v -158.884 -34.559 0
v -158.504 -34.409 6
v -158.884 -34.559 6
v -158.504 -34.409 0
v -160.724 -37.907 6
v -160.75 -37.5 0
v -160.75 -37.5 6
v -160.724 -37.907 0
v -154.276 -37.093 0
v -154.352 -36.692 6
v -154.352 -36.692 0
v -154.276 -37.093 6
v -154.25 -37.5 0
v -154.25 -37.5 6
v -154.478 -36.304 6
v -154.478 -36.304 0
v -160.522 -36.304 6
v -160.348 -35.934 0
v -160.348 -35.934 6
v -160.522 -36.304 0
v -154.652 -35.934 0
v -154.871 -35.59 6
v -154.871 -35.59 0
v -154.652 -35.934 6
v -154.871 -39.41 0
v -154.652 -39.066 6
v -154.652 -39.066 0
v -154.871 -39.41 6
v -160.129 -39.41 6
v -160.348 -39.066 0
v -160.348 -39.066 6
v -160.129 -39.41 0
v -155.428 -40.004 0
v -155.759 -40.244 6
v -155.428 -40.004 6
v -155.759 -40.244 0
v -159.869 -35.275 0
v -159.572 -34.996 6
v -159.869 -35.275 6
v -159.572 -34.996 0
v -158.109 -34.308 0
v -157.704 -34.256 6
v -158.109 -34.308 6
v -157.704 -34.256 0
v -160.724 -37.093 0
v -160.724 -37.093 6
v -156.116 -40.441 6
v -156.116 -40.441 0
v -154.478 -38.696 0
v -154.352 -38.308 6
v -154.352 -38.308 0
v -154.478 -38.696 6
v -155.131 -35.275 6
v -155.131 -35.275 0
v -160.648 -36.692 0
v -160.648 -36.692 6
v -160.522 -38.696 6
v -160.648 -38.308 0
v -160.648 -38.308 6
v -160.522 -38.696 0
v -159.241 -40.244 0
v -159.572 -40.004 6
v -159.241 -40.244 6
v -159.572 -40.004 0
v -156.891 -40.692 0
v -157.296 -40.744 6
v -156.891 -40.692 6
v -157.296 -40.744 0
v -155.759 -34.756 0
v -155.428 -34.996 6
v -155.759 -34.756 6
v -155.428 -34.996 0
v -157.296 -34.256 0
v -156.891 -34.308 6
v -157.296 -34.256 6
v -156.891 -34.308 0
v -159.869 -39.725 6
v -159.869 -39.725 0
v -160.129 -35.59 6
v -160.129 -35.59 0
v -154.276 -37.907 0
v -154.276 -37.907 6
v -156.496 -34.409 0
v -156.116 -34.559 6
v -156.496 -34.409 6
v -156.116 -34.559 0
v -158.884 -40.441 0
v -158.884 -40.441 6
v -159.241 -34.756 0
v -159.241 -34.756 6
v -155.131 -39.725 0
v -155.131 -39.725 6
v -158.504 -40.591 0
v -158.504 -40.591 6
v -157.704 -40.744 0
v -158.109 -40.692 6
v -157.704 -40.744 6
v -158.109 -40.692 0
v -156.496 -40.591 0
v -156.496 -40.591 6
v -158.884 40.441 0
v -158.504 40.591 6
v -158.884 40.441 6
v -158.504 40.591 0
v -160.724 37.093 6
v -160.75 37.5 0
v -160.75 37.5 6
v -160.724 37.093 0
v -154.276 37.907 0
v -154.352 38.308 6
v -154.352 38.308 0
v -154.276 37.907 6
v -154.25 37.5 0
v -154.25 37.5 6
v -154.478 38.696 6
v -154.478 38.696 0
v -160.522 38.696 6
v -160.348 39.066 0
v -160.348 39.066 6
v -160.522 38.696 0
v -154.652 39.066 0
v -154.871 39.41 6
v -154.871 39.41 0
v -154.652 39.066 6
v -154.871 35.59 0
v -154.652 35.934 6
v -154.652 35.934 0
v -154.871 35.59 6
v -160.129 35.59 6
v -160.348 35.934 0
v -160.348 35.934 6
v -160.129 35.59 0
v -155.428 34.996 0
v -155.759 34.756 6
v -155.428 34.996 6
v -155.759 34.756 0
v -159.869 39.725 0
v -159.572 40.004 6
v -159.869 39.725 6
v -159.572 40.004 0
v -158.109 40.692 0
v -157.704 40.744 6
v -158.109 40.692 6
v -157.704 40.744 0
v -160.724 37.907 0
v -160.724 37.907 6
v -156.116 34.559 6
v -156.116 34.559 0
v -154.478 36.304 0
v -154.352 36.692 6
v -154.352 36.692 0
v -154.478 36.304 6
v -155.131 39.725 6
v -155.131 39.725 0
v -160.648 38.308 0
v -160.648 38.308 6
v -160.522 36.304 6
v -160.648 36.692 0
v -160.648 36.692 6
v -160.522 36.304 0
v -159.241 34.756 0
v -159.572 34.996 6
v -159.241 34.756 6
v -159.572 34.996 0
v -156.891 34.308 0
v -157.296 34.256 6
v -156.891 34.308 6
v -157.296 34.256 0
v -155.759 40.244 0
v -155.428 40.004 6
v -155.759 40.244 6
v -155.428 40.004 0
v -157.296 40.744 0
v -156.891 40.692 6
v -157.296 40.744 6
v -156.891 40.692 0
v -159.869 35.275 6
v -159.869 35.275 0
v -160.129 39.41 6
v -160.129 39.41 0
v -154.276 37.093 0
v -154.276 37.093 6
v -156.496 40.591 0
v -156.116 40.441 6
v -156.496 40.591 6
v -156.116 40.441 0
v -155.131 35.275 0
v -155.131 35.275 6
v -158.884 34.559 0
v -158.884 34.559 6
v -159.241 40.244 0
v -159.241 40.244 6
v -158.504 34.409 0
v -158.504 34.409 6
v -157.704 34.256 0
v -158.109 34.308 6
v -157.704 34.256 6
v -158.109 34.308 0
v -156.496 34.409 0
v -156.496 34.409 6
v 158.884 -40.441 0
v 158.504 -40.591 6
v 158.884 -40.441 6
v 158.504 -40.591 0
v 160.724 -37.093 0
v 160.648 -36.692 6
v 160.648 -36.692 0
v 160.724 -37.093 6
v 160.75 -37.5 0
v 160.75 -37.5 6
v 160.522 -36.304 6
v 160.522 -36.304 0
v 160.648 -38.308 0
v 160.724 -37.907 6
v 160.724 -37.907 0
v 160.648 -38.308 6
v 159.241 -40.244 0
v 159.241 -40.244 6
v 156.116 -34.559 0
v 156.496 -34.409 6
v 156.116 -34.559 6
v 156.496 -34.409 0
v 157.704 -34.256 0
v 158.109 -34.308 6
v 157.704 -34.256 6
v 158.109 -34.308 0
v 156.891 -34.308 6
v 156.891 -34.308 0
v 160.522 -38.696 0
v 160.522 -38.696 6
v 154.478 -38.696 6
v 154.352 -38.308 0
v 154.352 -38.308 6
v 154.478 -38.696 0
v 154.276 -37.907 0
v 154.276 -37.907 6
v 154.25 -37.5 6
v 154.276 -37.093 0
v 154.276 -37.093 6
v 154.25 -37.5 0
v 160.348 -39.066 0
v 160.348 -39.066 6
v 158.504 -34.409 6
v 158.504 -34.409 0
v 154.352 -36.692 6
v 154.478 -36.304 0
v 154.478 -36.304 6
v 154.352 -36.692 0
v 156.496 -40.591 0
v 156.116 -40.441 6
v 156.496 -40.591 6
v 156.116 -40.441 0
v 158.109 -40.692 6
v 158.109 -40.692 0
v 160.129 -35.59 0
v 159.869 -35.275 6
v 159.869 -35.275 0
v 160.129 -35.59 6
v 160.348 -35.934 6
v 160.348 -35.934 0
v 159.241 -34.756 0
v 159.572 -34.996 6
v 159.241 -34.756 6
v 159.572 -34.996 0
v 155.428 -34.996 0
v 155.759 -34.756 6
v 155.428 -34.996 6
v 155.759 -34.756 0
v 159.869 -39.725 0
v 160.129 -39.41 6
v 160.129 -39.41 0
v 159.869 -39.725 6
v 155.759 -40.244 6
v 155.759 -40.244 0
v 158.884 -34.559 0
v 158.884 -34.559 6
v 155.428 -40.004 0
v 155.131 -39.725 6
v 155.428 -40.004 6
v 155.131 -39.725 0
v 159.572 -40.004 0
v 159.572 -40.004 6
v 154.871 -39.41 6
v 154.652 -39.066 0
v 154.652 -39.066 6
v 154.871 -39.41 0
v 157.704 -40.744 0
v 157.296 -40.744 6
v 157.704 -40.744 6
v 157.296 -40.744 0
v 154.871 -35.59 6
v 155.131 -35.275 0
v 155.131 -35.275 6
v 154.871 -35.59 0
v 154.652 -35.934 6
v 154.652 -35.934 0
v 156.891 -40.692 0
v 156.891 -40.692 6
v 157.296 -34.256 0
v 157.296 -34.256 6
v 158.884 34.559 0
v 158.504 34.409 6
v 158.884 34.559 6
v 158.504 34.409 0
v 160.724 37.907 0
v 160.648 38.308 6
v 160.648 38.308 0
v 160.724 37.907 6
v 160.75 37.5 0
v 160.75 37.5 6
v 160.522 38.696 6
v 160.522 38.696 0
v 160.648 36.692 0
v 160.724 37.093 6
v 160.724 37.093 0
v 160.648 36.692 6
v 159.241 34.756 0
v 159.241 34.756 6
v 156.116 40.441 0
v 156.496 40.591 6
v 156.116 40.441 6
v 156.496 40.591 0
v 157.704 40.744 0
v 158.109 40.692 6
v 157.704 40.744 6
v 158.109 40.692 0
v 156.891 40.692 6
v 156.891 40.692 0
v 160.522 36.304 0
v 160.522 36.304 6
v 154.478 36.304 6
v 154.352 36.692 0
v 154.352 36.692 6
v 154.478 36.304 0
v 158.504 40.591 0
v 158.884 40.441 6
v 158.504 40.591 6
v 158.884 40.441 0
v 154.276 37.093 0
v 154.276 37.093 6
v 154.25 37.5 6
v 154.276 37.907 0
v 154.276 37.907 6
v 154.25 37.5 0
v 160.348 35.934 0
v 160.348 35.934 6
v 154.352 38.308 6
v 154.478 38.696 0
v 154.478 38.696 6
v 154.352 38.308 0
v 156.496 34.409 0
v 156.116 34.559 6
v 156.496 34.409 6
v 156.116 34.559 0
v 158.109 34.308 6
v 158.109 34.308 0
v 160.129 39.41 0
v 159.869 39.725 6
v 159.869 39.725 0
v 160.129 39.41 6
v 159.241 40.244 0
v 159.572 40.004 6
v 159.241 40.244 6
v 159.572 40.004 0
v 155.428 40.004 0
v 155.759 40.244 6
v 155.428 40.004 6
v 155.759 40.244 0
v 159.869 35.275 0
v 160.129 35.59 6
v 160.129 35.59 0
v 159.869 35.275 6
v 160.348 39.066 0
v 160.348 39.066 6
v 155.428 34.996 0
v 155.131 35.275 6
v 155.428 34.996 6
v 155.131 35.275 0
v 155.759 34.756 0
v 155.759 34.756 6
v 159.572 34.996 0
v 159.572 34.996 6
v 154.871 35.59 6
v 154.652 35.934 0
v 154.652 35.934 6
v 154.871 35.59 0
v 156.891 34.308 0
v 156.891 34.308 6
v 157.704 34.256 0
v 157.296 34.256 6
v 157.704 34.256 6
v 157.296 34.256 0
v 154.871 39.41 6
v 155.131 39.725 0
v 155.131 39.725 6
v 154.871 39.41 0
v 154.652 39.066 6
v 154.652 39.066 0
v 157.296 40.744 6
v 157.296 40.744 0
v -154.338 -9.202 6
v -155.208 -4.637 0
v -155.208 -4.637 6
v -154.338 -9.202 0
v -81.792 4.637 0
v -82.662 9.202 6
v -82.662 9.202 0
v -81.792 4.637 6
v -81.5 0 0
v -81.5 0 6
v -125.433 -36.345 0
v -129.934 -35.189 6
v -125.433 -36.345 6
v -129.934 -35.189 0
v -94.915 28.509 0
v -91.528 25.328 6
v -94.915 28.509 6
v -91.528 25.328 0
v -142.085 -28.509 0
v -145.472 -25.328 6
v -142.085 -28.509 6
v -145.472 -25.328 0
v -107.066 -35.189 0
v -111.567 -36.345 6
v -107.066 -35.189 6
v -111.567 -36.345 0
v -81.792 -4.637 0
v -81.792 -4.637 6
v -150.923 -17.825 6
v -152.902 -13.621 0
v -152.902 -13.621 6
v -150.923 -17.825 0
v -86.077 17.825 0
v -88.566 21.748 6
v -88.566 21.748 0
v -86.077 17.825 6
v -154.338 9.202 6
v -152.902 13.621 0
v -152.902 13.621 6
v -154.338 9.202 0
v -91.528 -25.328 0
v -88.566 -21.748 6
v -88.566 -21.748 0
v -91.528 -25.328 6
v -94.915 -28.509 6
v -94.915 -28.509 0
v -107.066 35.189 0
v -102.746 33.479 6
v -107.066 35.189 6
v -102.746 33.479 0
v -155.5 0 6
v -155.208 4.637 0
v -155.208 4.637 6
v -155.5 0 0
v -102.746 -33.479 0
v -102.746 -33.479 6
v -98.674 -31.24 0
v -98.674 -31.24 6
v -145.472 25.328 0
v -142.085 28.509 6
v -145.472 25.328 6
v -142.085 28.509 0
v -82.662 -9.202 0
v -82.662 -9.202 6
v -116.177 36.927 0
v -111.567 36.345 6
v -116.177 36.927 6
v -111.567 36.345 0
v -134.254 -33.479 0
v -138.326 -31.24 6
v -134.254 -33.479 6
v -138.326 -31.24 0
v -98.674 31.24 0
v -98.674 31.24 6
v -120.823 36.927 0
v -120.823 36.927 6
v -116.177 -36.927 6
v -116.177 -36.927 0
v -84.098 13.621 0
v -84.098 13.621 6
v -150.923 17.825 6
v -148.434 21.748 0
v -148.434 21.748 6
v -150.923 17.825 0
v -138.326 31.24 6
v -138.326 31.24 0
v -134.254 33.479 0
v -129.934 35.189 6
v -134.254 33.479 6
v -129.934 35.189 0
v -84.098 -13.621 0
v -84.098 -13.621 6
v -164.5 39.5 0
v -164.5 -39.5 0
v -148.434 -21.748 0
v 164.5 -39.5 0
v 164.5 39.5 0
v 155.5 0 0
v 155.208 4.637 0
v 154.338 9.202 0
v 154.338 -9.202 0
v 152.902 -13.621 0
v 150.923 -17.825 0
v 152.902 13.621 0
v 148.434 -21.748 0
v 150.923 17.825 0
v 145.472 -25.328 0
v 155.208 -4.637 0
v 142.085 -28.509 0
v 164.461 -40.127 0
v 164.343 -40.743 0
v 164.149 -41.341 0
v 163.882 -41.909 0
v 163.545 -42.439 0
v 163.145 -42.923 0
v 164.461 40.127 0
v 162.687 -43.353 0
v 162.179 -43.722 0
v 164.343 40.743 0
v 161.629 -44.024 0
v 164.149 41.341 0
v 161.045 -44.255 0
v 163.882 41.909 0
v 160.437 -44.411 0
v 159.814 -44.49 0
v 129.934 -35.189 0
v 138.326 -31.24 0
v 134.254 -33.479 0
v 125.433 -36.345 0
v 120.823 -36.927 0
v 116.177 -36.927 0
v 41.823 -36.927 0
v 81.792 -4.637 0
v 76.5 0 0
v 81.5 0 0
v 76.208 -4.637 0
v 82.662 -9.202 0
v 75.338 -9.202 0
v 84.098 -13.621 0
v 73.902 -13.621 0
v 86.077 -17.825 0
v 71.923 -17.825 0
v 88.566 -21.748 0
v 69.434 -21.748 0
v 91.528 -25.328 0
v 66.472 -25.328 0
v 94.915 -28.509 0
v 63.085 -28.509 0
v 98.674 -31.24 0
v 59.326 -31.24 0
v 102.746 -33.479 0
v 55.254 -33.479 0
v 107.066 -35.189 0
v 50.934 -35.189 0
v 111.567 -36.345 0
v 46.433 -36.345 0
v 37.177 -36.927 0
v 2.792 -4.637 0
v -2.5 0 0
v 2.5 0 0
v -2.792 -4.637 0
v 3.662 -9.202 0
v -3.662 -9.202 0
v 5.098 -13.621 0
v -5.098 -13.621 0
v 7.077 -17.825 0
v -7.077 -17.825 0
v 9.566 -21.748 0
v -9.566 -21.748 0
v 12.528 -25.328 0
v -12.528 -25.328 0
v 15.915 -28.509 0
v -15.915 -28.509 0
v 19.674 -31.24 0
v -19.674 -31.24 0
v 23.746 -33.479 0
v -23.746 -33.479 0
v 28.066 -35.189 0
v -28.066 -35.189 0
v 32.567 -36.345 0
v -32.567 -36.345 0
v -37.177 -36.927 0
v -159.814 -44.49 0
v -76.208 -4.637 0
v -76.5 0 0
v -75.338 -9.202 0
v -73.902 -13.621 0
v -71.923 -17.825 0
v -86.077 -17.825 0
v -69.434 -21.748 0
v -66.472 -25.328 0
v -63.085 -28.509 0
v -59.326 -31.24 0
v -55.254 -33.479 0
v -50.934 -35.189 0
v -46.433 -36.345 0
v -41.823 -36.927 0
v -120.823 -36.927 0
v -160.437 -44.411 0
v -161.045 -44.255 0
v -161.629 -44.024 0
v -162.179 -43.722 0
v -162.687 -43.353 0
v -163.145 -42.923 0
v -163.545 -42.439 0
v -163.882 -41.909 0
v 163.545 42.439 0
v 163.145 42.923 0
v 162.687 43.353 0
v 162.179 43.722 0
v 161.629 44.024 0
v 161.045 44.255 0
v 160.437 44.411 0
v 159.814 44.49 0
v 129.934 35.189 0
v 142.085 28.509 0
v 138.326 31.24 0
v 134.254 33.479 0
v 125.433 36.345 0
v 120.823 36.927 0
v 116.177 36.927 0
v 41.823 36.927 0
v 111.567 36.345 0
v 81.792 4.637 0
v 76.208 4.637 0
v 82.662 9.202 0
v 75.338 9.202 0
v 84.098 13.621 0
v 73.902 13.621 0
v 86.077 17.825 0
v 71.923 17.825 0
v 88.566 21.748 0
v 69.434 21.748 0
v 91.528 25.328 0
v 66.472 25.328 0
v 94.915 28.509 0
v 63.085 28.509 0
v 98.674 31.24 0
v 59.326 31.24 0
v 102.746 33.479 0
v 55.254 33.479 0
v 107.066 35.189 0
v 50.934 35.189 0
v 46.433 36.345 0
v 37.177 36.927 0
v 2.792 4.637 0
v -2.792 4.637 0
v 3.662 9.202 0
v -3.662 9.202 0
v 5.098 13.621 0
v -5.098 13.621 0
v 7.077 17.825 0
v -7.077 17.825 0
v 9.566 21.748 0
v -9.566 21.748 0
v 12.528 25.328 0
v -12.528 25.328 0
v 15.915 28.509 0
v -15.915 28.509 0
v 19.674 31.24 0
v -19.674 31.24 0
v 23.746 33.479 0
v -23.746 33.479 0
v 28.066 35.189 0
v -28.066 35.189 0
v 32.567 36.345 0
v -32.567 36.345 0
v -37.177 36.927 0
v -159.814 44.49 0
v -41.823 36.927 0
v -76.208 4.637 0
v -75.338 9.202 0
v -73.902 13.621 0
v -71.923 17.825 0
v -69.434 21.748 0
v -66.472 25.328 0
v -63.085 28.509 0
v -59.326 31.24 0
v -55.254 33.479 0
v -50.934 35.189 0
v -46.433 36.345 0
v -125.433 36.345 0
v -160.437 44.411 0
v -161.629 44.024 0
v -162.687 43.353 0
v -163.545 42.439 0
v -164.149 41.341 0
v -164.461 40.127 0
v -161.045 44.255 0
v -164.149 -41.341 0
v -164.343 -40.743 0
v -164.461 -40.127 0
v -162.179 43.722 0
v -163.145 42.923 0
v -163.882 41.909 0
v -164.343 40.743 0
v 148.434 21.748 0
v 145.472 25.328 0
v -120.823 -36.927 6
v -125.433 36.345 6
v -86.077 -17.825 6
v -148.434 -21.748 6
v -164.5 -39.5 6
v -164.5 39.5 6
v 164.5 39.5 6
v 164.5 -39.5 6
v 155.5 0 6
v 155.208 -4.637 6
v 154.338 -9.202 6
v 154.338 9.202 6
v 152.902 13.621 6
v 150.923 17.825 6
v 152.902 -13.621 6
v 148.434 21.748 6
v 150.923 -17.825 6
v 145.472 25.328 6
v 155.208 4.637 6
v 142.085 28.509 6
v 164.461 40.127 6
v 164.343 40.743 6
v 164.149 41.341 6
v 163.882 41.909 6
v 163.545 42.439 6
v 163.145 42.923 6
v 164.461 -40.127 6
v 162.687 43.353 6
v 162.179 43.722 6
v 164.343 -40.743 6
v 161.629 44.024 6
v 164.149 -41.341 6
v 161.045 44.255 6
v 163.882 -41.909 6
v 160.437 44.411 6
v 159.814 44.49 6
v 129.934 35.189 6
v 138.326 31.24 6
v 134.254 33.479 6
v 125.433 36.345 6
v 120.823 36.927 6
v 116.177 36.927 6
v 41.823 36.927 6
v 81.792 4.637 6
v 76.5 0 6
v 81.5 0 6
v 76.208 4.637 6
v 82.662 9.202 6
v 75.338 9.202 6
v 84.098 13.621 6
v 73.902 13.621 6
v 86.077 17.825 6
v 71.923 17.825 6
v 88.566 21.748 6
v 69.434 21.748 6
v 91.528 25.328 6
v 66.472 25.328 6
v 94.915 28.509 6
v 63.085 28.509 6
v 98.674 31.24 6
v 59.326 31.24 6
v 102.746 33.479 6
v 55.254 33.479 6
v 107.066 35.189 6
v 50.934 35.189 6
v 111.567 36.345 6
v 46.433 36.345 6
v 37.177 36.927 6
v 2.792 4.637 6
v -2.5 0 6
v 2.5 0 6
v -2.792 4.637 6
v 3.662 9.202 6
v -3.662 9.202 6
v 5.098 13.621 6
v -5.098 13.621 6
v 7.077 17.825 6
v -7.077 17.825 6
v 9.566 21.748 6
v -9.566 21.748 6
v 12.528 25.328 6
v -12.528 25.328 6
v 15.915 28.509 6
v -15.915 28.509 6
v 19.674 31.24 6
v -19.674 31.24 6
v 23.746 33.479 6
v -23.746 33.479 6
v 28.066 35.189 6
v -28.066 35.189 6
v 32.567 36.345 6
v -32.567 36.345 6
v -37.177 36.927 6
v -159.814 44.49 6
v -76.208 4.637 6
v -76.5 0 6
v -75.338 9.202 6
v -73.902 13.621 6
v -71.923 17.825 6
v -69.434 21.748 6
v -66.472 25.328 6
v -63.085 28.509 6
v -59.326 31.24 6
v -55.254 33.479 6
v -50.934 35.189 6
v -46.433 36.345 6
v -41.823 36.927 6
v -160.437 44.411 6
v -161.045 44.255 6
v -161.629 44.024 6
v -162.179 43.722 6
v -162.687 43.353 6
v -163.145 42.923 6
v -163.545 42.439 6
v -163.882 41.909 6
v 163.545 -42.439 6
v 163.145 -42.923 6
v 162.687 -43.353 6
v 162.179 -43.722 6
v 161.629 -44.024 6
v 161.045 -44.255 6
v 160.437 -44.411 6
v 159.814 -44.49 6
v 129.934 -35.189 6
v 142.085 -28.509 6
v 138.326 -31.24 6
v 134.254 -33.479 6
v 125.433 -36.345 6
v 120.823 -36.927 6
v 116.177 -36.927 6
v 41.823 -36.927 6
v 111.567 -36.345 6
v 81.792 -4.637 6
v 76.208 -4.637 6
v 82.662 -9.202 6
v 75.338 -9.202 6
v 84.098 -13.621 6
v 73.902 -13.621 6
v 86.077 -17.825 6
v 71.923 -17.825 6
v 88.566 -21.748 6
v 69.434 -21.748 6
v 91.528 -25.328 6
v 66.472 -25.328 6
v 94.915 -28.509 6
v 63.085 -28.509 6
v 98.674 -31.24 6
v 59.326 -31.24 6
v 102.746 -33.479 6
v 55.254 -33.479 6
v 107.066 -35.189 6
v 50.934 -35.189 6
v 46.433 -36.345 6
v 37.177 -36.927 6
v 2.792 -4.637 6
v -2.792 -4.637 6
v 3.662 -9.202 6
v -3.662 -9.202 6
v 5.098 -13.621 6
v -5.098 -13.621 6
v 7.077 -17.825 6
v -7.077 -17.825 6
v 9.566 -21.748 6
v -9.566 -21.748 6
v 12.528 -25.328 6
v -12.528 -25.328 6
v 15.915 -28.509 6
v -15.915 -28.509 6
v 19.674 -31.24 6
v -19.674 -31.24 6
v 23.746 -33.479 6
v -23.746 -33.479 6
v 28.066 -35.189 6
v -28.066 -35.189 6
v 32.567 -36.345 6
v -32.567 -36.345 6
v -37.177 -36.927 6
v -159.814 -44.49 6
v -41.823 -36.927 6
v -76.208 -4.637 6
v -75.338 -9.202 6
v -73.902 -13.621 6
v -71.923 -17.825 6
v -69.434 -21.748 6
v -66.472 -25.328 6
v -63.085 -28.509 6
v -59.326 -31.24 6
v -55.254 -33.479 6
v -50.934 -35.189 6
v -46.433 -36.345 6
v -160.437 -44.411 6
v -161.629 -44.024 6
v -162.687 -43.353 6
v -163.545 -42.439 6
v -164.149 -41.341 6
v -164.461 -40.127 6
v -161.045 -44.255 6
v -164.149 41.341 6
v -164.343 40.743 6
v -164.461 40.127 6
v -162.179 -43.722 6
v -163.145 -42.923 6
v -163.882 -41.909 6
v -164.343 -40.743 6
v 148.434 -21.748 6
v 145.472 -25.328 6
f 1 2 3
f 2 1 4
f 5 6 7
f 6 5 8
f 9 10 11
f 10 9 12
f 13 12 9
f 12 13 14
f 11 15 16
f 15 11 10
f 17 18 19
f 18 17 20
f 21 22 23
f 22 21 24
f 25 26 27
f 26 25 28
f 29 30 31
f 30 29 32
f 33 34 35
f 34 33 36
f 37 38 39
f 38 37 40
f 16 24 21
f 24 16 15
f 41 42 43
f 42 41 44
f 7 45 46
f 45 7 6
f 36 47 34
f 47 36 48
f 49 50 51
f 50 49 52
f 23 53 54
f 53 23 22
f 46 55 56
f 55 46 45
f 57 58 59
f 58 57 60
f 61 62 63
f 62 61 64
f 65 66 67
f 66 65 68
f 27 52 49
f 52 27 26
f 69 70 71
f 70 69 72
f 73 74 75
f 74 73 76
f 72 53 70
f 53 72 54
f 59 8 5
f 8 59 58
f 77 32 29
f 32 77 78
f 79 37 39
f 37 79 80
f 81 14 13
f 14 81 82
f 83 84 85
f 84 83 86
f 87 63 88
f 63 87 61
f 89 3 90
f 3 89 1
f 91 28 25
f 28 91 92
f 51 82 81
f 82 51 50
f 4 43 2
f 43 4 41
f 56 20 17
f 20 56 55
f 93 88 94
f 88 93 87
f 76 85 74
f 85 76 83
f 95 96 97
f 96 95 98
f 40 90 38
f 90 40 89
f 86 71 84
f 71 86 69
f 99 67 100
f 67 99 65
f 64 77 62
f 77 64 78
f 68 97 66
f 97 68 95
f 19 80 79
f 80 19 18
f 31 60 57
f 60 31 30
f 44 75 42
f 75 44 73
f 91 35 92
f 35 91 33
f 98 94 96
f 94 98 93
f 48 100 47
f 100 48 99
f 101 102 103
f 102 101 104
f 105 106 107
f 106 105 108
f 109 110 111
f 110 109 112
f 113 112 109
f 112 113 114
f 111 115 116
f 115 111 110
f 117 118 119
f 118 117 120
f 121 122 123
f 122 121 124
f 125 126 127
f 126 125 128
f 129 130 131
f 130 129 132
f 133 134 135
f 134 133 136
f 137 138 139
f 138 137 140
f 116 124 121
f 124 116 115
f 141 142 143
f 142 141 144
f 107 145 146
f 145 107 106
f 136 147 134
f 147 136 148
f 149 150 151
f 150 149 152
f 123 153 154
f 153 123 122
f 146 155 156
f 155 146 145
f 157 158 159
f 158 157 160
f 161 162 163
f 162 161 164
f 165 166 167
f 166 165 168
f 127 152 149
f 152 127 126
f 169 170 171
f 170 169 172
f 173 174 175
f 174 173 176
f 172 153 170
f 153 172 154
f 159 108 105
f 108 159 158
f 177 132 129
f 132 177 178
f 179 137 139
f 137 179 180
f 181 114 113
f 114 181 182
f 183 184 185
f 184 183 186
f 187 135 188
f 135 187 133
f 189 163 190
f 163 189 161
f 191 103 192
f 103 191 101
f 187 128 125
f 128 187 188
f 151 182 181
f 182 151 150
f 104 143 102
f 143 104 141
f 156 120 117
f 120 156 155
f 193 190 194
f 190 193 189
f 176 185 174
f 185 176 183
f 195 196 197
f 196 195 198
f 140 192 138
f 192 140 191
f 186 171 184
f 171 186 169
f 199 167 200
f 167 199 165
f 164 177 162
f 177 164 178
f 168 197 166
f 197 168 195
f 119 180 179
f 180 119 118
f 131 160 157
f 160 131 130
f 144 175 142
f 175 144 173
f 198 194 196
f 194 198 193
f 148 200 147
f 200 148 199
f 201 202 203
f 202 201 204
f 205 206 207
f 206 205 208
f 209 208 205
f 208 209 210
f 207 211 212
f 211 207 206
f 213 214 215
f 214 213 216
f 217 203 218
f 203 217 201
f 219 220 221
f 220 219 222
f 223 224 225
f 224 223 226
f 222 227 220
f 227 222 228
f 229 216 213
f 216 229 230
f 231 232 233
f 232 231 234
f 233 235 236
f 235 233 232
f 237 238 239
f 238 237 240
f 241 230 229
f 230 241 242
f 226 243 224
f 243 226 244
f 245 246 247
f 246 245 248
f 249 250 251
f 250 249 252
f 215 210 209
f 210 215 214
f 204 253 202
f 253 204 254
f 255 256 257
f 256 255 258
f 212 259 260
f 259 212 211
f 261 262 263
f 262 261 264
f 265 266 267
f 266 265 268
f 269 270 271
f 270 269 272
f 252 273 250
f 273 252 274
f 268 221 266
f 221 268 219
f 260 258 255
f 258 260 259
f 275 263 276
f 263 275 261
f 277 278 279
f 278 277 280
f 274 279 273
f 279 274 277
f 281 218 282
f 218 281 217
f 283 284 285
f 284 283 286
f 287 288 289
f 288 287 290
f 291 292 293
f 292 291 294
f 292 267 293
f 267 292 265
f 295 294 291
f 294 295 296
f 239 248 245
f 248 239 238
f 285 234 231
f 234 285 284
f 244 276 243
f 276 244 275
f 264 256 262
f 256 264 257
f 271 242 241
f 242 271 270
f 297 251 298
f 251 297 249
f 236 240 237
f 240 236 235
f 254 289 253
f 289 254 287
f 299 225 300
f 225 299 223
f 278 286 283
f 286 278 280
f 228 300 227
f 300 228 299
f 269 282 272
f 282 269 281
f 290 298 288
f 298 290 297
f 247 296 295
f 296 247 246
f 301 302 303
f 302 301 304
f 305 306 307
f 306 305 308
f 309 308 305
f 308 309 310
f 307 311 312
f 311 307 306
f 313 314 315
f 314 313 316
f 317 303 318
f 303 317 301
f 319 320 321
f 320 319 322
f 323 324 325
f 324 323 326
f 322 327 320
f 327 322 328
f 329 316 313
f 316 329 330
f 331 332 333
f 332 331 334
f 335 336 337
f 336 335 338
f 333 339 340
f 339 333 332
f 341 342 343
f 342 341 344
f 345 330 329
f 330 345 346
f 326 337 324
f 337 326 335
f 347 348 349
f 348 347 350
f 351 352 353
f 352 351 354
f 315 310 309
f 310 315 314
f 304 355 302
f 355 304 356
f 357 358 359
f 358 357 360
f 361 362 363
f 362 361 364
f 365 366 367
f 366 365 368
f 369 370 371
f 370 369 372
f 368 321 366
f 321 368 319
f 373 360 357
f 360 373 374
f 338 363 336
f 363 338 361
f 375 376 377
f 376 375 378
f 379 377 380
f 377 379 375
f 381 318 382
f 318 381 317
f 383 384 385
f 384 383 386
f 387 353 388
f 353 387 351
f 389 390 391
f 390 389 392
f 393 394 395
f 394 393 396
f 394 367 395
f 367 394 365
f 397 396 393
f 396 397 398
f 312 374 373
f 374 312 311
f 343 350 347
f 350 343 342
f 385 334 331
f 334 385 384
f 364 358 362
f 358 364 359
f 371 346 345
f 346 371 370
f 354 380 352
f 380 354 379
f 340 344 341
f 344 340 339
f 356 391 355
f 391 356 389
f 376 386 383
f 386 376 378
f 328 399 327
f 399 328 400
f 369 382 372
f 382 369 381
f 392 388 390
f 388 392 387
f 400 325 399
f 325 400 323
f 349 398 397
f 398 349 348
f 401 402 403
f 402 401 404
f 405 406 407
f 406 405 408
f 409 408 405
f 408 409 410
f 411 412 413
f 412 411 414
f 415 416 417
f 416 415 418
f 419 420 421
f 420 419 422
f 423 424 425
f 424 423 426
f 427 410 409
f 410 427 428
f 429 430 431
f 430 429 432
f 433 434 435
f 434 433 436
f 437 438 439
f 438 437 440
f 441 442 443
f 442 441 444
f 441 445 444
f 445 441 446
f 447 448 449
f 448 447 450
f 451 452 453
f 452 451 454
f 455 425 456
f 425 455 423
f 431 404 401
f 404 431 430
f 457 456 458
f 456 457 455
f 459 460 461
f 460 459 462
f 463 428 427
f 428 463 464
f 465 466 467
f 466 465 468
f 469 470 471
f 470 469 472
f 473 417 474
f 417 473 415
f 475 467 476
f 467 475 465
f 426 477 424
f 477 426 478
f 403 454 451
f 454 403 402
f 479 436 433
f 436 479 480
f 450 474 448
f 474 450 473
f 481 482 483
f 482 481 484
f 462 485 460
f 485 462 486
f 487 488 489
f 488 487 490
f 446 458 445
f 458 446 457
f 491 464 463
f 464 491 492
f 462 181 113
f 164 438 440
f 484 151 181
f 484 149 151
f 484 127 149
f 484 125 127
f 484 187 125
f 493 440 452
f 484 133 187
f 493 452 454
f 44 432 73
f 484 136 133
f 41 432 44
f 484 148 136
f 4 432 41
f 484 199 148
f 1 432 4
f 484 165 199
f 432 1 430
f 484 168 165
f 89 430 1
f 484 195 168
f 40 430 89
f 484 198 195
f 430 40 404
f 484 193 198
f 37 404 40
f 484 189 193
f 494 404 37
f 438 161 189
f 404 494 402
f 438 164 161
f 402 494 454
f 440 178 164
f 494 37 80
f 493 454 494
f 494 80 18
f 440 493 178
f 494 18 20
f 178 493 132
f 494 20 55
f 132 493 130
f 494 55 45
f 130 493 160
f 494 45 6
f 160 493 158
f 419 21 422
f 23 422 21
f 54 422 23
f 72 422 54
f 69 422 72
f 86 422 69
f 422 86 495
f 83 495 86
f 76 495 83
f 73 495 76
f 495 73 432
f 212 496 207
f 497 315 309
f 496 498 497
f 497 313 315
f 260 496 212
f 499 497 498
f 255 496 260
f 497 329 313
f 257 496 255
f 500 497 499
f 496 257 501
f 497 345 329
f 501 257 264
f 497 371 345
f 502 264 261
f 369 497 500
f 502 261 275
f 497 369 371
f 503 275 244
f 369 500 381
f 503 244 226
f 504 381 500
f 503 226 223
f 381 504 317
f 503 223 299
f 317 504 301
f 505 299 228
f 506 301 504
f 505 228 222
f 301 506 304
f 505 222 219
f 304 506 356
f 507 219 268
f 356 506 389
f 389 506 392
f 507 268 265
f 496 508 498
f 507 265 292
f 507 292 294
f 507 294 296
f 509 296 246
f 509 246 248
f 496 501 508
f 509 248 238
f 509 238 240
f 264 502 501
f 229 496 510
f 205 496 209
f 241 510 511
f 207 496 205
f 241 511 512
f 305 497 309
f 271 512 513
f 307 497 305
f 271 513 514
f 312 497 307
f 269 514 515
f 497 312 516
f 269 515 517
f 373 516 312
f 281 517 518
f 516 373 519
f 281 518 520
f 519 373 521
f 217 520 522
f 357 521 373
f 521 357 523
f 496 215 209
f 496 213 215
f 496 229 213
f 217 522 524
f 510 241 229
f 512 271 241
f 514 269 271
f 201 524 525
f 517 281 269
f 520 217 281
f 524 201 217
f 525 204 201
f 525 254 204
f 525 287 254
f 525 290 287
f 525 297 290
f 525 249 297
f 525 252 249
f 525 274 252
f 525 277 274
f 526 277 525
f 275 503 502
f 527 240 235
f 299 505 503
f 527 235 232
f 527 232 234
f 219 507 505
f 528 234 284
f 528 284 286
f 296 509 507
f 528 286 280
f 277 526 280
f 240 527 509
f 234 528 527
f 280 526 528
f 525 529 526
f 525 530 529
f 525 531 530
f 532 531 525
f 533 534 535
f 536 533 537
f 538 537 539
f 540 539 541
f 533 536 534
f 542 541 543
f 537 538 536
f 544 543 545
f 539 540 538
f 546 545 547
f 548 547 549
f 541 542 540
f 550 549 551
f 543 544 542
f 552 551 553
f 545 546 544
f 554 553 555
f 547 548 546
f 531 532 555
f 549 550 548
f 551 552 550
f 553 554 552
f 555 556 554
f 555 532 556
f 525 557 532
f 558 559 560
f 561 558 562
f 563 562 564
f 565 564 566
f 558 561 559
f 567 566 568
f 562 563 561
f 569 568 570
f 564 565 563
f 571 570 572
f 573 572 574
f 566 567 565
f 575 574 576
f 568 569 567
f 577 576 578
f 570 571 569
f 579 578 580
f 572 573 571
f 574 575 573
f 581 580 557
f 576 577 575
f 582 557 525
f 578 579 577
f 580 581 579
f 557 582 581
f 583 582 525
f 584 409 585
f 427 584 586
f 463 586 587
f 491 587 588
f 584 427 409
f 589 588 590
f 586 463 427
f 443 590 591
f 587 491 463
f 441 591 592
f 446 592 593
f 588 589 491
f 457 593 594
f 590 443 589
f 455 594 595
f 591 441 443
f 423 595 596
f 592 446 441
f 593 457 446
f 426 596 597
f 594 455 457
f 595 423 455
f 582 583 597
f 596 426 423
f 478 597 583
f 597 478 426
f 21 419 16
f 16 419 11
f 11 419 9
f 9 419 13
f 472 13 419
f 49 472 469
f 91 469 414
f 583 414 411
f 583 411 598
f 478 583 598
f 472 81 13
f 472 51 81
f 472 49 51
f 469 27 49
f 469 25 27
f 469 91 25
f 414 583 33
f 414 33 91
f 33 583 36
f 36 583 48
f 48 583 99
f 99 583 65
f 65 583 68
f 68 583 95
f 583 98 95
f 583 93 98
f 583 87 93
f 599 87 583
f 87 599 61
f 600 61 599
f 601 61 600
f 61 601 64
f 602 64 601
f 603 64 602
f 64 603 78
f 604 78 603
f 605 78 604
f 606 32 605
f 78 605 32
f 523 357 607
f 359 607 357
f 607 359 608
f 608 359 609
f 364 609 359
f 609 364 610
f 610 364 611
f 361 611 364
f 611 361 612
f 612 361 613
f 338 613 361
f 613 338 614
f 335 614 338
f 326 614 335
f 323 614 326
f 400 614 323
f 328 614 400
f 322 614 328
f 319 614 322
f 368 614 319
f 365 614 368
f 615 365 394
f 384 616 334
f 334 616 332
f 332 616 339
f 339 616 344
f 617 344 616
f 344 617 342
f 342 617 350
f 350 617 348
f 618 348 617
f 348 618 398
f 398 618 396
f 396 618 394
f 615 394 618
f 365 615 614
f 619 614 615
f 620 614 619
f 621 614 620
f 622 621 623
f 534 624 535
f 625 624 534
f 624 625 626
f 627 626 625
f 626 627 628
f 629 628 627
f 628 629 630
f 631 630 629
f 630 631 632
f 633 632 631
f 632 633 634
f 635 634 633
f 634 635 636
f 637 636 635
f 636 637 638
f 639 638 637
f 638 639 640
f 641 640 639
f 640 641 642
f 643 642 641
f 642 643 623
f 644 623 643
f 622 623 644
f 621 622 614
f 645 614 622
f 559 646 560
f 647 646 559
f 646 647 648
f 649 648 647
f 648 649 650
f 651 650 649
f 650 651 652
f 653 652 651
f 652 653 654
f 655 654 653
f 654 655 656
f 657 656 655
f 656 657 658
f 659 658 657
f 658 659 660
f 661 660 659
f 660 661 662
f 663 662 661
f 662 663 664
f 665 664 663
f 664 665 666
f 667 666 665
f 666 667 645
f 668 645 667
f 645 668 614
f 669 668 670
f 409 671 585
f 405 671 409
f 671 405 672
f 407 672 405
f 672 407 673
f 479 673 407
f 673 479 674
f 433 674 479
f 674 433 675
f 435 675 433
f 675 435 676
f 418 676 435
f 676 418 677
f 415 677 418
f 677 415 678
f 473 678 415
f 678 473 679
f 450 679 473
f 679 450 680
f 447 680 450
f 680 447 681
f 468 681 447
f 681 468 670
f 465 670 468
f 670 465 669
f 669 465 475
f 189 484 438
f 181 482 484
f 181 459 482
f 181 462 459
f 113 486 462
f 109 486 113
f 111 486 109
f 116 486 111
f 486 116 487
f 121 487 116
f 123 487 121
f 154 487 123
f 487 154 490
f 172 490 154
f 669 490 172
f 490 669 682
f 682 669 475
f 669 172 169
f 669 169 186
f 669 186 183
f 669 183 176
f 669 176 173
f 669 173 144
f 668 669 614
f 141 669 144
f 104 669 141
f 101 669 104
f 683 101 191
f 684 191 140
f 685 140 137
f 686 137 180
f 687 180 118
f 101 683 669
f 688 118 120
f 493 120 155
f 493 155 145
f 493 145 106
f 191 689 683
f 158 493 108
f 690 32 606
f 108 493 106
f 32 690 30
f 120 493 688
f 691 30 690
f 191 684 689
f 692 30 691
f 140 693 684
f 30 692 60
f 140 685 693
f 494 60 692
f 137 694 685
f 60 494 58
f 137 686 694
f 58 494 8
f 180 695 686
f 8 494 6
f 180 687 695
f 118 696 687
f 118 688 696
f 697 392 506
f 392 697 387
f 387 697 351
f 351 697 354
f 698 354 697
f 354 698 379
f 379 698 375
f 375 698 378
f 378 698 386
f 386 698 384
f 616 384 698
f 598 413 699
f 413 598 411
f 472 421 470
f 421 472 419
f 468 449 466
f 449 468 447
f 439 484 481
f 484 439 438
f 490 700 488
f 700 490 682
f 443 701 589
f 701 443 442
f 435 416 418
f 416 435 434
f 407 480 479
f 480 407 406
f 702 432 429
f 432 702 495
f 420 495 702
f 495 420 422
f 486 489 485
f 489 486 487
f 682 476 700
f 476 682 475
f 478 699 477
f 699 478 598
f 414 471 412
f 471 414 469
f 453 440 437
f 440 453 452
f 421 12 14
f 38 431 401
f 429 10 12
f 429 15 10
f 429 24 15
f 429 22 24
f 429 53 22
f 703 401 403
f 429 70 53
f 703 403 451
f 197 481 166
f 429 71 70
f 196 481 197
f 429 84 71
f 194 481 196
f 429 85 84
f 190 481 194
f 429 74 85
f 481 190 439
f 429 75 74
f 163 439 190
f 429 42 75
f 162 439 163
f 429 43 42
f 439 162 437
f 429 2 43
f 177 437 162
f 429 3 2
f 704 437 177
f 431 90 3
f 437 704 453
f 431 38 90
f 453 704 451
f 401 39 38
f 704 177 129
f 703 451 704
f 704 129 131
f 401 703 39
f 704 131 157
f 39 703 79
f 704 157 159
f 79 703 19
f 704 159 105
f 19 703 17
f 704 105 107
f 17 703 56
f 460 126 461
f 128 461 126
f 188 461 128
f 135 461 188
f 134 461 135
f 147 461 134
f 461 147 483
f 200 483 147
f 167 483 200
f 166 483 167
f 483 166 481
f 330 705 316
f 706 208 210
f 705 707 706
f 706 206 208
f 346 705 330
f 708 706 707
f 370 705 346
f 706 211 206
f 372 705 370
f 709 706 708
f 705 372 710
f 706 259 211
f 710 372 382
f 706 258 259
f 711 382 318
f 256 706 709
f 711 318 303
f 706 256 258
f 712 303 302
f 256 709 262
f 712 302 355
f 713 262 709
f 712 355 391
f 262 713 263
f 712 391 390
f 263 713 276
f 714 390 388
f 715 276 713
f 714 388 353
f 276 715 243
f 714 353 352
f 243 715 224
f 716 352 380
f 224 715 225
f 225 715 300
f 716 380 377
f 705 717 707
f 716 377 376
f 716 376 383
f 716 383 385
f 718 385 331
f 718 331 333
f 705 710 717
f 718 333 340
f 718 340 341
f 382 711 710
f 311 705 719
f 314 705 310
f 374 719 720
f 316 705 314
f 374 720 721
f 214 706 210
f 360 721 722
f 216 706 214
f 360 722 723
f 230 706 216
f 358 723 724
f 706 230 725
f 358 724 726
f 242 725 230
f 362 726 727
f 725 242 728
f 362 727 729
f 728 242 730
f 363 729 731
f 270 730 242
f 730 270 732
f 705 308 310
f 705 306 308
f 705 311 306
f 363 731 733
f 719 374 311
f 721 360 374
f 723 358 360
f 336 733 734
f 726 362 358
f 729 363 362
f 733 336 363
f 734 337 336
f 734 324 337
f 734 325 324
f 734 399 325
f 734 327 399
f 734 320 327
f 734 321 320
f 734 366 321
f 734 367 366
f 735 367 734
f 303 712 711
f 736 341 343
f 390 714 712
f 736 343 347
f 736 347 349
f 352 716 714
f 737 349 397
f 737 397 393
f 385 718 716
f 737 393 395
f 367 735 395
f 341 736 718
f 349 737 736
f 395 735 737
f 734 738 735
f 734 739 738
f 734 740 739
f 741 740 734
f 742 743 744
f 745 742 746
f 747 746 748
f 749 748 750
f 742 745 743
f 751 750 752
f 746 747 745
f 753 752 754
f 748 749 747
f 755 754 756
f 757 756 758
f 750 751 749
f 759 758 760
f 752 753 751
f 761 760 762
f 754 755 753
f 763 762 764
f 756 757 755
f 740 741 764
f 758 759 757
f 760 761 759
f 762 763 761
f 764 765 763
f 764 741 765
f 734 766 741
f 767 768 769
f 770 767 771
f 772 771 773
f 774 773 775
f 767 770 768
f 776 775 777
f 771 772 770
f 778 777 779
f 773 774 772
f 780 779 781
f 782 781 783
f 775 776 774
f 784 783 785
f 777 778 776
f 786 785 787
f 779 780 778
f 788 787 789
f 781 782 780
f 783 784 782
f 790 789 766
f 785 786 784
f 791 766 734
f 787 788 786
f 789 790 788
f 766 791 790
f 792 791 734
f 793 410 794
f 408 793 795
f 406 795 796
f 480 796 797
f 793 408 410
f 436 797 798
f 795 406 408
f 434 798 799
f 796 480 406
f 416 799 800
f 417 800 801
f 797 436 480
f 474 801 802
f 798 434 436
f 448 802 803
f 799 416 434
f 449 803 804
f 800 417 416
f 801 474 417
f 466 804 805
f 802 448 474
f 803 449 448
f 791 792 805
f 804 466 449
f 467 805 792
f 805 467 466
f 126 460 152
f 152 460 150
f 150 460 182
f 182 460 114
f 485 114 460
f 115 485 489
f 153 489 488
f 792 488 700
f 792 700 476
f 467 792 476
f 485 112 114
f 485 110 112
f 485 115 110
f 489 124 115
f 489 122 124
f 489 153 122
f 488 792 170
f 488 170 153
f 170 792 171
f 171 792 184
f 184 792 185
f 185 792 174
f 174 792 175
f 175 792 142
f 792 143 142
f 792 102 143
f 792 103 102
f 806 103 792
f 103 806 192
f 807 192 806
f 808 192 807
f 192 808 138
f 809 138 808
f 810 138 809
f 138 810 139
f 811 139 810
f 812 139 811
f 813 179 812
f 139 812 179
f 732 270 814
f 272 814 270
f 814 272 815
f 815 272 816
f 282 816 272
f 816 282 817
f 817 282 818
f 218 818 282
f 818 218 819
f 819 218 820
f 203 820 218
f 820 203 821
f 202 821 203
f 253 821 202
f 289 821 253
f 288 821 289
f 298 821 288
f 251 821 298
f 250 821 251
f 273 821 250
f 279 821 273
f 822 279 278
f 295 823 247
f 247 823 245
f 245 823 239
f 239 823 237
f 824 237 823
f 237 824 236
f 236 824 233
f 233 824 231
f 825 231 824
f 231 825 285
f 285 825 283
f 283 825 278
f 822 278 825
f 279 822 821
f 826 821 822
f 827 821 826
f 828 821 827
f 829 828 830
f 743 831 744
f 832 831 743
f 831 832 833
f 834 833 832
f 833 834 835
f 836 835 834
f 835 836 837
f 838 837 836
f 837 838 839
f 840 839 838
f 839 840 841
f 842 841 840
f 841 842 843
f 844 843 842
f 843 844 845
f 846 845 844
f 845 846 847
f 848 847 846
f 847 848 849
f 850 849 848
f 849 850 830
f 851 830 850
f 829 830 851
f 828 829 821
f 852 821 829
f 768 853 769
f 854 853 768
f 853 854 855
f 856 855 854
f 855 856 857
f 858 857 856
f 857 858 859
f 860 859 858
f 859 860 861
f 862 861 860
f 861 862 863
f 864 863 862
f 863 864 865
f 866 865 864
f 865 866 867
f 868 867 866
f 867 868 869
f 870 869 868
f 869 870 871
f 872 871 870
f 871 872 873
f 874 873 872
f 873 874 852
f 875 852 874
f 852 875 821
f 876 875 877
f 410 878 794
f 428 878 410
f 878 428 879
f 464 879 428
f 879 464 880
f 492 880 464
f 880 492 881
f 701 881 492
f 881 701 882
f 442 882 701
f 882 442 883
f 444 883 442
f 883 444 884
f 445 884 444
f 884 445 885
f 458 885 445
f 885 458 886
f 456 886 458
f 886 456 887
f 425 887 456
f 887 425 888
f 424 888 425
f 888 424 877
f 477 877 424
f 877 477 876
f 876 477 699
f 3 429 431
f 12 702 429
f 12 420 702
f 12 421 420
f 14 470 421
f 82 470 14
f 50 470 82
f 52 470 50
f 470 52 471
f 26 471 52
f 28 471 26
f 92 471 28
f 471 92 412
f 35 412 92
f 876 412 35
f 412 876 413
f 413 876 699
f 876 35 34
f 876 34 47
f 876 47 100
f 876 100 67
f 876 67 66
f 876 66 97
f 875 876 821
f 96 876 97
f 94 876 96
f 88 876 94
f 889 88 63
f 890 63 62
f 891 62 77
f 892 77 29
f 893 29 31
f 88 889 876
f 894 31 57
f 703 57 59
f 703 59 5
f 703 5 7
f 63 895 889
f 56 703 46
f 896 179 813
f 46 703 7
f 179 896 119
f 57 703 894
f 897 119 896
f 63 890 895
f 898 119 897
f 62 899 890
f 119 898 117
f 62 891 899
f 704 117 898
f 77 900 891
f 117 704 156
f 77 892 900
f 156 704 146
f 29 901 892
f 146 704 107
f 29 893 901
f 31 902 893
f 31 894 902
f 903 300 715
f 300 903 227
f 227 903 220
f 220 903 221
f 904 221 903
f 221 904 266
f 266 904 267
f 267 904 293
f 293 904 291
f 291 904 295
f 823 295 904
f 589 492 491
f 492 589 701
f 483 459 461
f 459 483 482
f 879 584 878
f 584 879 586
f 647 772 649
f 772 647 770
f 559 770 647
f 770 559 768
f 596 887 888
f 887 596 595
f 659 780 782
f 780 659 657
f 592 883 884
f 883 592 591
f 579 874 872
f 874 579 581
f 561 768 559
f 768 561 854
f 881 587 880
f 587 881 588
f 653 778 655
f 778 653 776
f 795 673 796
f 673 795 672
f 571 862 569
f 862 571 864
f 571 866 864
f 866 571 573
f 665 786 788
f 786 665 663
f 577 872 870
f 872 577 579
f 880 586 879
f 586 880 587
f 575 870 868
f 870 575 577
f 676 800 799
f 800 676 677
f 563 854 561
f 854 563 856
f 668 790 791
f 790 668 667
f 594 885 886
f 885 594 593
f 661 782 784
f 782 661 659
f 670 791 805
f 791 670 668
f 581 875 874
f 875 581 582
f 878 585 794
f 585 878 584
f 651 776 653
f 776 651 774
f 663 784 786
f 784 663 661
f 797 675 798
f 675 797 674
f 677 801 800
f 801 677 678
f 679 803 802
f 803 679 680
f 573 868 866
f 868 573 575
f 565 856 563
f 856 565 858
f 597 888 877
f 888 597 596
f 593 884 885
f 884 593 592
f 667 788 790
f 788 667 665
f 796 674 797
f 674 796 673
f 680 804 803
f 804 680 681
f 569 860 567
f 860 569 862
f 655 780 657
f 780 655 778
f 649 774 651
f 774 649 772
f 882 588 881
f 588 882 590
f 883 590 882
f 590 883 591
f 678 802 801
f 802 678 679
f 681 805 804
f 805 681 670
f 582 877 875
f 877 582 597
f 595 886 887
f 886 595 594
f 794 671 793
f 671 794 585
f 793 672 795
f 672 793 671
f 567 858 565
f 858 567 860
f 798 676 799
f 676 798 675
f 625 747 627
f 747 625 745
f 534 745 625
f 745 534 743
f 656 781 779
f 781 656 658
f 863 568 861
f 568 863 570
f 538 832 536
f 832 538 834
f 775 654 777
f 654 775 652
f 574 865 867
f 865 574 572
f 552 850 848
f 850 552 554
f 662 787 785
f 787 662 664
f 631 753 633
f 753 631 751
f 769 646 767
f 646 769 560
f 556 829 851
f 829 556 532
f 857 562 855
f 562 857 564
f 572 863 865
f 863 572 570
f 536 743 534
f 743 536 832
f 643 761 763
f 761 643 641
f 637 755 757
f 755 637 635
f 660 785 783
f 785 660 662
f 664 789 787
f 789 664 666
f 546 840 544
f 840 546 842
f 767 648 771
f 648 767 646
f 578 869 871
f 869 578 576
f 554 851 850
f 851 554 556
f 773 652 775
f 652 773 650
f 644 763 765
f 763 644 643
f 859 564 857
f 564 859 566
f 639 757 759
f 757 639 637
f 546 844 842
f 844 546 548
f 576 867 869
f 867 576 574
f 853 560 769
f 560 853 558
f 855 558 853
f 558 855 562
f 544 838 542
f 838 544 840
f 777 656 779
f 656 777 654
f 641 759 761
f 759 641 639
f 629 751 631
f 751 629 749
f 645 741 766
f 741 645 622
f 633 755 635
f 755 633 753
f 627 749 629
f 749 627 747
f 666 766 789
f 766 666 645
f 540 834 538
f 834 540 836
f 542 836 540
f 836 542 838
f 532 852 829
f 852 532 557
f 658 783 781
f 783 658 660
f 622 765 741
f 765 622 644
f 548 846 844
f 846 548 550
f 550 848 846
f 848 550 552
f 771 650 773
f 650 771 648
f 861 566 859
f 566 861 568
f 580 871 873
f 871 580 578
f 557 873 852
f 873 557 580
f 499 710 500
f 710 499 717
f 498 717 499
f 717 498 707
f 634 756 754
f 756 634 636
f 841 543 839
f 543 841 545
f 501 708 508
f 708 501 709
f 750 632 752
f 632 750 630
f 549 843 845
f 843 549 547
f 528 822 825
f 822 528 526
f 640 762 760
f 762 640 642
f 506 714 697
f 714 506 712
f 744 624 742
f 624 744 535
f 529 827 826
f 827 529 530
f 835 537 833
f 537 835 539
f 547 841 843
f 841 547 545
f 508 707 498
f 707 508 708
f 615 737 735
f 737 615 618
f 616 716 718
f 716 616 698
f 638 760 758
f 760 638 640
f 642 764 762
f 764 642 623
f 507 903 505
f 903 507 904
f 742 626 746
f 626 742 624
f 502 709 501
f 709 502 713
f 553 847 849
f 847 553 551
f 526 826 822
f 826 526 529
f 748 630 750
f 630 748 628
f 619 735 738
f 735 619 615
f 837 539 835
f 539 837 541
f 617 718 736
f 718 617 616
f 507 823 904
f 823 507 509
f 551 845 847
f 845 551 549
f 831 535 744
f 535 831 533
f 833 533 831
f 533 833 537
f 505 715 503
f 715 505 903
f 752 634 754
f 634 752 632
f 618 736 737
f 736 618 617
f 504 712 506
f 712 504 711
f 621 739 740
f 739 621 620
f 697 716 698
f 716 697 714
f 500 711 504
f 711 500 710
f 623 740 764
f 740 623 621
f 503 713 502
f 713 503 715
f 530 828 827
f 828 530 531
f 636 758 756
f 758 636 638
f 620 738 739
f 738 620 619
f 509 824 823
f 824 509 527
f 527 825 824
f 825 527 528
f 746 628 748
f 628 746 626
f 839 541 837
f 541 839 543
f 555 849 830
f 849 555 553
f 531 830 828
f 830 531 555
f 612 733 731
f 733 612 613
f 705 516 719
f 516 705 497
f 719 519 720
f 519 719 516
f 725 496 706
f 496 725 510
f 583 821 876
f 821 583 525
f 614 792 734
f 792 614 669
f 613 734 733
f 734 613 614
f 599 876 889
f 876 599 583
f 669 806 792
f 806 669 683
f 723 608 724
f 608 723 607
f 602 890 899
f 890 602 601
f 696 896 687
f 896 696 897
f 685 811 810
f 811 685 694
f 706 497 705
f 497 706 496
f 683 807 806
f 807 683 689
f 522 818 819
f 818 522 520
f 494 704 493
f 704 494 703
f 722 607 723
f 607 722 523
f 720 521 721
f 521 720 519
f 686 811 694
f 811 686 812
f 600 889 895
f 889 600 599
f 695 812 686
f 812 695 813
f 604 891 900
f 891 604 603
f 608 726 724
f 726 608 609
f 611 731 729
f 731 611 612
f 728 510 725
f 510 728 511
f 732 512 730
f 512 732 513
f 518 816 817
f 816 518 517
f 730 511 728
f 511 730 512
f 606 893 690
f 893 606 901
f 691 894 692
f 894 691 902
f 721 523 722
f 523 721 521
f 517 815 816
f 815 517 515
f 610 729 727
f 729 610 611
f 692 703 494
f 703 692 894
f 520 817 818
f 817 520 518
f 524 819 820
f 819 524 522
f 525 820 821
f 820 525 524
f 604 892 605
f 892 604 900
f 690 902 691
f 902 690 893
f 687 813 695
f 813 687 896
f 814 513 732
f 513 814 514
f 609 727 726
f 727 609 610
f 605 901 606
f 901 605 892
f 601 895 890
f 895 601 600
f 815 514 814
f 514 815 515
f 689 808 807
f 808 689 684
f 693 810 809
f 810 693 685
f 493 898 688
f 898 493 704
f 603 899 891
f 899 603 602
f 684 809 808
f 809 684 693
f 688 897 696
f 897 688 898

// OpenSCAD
$fn = 50;


difference() {
	union() {
		hull() {
			translate(v = [-159.5000000000, 39.5000000000, 0]) {
				cylinder(h = 6, r = 5);
			}
			translate(v = [159.5000000000, 39.5000000000, 0]) {
				cylinder(h = 6, r = 5);
			}
			translate(v = [-159.5000000000, -39.5000000000, 0]) {
				cylinder(h = 6, r = 5);
			}
			translate(v = [159.5000000000, -39.5000000000, 0]) {
				cylinder(h = 6, r = 5);
			}
		}
	}
	union() {
		#translate(v = [-157.5000000000, -37.5000000000, -100.0000000000]) {
			cylinder(h = 200, r = 3.2500000000);
		}
		#translate(v = [-157.5000000000, 37.5000000000, -100.0000000000]) {
			cylinder(h = 200, r = 3.2500000000);
		}
		#translate(v = [157.5000000000, -37.5000000000, -100.0000000000]) {
			cylinder(h = 200, r = 3.2500000000);
		}
		#translate(v = [157.5000000000, 37.5000000000, -100.0000000000]) {
			cylinder(h = 200, r = 3.2500000000);
		}
		#translate(v = [-118.5000000000, 0, 0]) {
			cylinder(h = 6, r = 37.0000000000);
		}
		#translate(v = [-39.5000000000, 0, 0]) {
			cylinder(h = 6, r = 37.0000000000);
		}
		#translate(v = [39.5000000000, 0, 0]) {
			cylinder(h = 6, r = 37.0000000000);
		}
		#translate(v = [118.5000000000, 0, 0]) {
			cylinder(h = 6, r = 37.0000000000);
		}
	}
}
